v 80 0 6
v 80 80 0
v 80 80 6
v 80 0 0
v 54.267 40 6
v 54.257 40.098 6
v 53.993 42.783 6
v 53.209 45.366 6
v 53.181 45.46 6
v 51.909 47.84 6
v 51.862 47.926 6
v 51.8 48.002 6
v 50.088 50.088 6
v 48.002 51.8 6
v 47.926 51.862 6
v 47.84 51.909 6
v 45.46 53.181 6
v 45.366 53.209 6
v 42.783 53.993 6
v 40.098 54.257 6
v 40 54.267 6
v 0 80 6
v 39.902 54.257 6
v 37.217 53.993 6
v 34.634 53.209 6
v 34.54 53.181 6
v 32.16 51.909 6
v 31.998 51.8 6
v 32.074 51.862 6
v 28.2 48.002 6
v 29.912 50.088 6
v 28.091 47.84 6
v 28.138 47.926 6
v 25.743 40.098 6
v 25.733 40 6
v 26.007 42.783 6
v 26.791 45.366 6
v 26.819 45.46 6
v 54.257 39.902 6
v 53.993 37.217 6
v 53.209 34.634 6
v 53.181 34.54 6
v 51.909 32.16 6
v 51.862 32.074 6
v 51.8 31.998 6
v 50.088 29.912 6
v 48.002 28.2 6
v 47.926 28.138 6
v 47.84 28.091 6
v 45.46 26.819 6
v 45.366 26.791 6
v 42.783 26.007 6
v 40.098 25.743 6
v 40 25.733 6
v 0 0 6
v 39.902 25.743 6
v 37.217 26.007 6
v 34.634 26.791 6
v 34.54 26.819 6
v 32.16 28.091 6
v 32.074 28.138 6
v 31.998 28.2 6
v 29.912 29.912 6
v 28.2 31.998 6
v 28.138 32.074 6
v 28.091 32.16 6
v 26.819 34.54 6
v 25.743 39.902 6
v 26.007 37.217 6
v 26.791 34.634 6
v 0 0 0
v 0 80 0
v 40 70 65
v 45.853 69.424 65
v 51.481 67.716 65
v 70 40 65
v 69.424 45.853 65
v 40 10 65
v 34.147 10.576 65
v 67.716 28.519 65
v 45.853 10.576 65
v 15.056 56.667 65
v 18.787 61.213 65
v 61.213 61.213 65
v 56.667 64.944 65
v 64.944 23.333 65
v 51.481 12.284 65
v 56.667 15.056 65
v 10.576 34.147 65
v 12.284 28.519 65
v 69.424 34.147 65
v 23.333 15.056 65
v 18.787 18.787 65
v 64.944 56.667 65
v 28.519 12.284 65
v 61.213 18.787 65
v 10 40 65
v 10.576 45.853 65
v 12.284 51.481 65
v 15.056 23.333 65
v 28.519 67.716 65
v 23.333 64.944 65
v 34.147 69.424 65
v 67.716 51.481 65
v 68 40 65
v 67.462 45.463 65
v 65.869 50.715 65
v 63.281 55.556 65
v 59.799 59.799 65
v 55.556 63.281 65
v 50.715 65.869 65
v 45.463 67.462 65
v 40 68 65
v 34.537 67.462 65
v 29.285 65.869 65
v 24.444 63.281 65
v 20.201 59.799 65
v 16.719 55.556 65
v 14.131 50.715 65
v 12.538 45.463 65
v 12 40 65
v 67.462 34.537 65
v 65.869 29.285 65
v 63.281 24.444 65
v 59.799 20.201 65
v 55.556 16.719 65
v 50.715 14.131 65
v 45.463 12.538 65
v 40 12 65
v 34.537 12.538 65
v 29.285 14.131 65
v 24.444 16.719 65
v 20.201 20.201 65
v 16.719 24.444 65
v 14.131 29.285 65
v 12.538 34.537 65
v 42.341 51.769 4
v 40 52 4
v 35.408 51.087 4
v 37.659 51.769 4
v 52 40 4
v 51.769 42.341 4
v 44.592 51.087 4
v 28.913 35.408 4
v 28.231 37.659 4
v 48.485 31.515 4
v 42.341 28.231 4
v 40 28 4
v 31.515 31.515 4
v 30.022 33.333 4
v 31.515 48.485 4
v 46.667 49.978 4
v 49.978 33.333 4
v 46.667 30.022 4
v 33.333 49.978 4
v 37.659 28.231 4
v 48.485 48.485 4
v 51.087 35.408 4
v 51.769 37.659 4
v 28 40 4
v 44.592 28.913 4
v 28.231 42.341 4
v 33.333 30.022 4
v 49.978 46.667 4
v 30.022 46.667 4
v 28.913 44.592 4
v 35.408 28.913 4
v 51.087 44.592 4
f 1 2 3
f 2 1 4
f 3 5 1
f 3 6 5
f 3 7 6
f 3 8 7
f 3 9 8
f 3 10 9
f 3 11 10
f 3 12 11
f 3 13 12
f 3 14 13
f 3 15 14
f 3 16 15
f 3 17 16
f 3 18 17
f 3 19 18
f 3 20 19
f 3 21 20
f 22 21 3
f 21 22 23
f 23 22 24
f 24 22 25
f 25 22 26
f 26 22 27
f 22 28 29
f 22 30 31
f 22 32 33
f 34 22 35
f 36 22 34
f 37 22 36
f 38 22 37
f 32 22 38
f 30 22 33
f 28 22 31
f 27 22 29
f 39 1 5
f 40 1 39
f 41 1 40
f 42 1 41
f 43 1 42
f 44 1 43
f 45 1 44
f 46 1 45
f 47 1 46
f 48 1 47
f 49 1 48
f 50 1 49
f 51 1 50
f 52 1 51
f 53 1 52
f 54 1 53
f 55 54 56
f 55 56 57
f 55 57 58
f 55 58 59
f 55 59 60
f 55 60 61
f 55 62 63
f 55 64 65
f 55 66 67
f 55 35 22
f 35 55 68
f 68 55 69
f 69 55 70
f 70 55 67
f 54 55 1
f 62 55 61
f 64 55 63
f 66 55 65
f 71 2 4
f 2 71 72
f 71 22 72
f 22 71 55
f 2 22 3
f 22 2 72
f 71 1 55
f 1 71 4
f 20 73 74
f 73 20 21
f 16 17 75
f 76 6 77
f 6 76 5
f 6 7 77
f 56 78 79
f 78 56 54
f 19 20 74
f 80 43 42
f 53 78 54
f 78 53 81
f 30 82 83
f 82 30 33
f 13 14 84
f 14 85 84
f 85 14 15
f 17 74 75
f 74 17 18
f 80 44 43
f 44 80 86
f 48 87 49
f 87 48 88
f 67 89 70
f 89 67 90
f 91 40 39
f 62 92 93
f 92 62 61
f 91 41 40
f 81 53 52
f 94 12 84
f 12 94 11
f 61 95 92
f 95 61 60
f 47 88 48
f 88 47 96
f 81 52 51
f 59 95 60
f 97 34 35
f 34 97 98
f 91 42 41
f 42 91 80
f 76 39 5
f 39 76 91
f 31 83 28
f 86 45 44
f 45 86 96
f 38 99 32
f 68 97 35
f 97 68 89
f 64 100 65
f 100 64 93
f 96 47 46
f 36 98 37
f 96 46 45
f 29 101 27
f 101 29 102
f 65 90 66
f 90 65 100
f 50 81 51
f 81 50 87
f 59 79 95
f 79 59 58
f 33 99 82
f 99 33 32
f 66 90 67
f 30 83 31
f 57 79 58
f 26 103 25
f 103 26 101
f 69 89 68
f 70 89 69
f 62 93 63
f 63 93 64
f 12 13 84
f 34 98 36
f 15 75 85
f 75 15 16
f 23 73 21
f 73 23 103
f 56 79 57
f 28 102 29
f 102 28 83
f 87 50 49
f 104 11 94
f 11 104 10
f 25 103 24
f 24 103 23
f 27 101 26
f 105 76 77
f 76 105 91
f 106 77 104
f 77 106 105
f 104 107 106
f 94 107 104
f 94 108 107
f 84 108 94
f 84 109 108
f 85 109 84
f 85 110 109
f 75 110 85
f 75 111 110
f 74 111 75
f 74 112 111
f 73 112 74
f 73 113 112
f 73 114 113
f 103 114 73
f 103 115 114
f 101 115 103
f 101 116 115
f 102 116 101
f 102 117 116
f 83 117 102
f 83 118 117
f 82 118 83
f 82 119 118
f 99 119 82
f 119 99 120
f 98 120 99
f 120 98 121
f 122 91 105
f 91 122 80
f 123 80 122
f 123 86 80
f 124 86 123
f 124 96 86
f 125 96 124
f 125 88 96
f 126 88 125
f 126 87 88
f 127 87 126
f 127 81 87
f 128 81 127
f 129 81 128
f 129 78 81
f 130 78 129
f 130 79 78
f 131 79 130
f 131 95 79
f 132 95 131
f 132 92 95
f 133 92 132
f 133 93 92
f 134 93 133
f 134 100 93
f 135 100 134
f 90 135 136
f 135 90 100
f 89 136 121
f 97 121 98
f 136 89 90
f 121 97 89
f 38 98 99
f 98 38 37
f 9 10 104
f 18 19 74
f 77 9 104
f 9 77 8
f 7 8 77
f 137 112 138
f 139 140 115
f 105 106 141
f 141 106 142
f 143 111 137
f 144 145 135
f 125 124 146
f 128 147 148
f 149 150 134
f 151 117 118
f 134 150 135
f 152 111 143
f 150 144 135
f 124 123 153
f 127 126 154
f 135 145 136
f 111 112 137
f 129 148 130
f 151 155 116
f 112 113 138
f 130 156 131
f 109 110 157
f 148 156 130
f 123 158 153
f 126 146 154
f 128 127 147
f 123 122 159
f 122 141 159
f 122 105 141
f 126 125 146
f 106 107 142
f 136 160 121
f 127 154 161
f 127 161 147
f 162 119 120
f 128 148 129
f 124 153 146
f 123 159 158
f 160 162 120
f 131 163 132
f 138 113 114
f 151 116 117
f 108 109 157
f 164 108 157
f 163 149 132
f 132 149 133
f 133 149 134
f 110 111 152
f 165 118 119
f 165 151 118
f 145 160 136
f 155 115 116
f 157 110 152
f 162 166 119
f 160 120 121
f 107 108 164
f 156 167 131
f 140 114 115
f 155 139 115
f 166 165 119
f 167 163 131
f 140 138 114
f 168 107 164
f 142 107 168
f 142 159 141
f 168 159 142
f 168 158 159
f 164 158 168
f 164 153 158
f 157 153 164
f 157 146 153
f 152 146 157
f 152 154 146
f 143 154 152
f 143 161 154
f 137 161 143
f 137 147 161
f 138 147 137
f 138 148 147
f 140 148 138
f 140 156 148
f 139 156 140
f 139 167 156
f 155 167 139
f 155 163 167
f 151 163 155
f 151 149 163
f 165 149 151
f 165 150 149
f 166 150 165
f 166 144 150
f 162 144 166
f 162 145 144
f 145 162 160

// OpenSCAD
$fn = 32;

// ----------------------------------------------------------------------
// Hopper: funnel with square flange
// ----------------------------------------------------------------------

// --- parameters (mm) ---
fl = 80;                  // flange side, X and Y
fl_t = 6;                 // flange thickness
cone_h = 60;              // cone height above the flange
top_d = 60;               // cone mouth diameter
bot_d = 28;               // cone spout diameter
wall = 2;                 // cone wall thickness

bore_d = bot_d - 2 * wall;  // spout bore diameter
total_h = fl_t + cone_h - 1;  // overall height

difference() {
  union() {
    cube([fl, fl, fl_t]);
    translate([fl / 2, fl / 2, fl_t - 1])
      cylinder(h = cone_h, d1 = bot_d, d2 = top_d);
  }
  translate([fl / 2, fl / 2, fl_t - 2])
    cylinder(h = cone_h + 1, d1 = bore_d, d2 = top_d - 2 * wall);
}
